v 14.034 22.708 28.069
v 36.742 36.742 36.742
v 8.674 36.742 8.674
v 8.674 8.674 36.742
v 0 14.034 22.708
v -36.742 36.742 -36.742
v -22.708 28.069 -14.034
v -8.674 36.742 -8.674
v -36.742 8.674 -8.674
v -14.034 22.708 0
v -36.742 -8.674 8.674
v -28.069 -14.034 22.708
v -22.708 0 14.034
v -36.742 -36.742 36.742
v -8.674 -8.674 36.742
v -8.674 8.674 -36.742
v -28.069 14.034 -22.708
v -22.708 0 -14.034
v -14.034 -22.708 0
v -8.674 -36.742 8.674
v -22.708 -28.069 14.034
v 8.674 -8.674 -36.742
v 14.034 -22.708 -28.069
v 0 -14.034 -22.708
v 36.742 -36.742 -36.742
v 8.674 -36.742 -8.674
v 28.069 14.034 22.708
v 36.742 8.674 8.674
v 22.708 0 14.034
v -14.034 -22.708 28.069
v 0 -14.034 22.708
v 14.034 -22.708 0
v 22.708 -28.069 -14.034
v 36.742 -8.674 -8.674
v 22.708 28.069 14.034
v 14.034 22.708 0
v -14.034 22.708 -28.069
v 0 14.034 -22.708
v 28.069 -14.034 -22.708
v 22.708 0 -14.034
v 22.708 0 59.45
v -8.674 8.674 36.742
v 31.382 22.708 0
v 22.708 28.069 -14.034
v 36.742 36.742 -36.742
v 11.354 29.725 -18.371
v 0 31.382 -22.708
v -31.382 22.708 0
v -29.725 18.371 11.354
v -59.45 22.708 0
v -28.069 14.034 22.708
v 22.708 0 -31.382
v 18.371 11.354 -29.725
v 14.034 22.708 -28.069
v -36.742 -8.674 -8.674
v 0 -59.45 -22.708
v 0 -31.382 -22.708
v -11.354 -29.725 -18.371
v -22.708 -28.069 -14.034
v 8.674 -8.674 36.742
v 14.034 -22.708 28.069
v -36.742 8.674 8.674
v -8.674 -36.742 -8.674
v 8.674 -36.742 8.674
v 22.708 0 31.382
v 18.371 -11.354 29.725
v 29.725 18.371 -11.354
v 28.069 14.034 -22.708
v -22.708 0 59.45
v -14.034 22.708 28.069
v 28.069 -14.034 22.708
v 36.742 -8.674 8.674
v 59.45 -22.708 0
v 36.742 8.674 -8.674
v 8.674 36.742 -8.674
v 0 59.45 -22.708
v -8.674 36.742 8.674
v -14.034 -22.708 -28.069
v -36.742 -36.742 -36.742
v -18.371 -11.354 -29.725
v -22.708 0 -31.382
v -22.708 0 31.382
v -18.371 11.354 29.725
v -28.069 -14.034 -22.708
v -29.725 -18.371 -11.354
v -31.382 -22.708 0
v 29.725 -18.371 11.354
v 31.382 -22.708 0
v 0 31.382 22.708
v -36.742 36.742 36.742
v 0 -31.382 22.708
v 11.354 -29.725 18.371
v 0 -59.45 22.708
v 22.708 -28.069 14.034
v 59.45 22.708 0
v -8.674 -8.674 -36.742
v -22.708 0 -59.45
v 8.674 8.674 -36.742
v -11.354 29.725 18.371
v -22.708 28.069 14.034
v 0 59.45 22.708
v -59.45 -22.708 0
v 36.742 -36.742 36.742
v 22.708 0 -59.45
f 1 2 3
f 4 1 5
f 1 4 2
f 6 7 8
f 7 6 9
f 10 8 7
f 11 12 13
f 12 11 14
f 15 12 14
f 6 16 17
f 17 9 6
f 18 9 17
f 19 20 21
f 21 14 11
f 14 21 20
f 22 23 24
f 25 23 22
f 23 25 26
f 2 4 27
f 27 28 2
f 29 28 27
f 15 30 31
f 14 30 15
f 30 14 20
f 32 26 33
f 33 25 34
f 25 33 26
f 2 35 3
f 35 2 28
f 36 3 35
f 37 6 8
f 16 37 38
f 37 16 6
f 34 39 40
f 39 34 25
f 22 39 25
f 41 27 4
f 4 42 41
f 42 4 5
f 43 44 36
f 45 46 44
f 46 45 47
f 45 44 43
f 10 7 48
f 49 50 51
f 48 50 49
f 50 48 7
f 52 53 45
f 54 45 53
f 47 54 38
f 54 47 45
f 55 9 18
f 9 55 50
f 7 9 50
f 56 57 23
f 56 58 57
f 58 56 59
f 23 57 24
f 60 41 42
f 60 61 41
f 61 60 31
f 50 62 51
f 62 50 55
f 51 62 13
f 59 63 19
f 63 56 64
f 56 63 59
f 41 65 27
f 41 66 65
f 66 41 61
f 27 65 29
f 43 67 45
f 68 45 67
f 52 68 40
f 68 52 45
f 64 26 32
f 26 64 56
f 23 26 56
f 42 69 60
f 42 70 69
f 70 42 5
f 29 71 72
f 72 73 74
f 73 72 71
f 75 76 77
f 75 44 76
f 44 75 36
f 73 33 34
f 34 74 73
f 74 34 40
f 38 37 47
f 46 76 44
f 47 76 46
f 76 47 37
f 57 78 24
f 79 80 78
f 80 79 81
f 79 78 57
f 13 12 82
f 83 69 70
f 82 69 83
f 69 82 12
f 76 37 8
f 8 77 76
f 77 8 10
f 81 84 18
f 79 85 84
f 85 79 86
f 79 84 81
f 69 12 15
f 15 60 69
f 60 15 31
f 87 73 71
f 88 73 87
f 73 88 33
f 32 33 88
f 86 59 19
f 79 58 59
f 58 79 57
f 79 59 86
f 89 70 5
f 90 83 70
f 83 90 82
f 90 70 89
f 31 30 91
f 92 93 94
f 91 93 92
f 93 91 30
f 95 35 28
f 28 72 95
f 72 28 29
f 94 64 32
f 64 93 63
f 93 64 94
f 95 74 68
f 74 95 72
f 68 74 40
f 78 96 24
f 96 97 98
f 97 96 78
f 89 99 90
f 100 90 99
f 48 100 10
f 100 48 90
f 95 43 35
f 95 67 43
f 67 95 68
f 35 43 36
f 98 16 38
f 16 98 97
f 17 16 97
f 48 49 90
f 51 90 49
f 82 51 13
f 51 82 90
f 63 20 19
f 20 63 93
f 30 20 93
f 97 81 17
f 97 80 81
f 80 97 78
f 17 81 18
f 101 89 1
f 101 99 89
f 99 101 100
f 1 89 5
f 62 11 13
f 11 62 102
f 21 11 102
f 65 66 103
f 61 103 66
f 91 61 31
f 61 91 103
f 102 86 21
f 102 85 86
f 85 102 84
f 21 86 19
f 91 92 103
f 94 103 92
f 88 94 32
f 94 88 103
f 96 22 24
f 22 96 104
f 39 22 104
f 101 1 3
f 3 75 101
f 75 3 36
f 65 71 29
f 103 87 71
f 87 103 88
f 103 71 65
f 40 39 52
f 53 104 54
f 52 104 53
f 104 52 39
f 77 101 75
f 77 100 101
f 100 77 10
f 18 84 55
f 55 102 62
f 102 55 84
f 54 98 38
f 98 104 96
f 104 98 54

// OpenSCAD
phi = (1 + sqrt(5)) / 2;
iphi = 1 / phi;

sq13 = sqrt(1/3);
sq23 = sqrt(2/3);

base = 60 * sqrt(3/8);

// Top, clockwise looking down.  ring1 is highest.
ring1 = [[1,1,1], [iphi, 0, phi], [-iphi, 0, phi], [-1, 1, 1], [0, phi, iphi]];

ring2 = [
    [phi, iphi, 0], [1, -1, 1], [-1, -1, 1], [-phi, iphi, 0], [0,phi,-iphi]];

ring3 = [[phi, -iphi, 0], [0, -phi, +iphi], [-phi, -iphi, 0],
         [-1, 1, -1], [1, 1, -1]];

ring4 = [[1, -1, -1], [0, -phi, -iphi], [-1, -1, -1], [-iphi, 0, -phi],
         [iphi, 0, -phi]];

function r1(i) = ring1[i % 5];
function r2(i) = ring2[i % 5];
function r3(i) = ring3[i % 5];
function r4(i) = ring4[i % 5];

module tetrahedron(a, b, c, d) {
    scale(base) polyhedron(
        points=[a, b, c, d],
        faces=[
            [0, 1, 2],
            [1, 0, 3],
            [0, 2, 3],
            [3, 2, 1]]);
}

module quint() {
    for (i = [0:4])
        tetrahedron(r1(i), r2(i+2), r3(i+3), r4(i));
}

module levelquint() {
    difference() {
        multmatrix(
            [
                [ sq13, 0, sq23, 0],
                [    0, 1,    0, 0],
                [-sq23, 0, sq13, base / sqrt(3) + 0.001]])
            rotate(-45) quint();
        for (i = [0:2])
            rotate(i*120+45) rotate([0,90,0])
                cylinder(r=1.1, h=base*phi - 15, $fn=20);
    }
}

module spikes() {
    rotate([180,0,0]) difference() {
        levelquint();
        translate([0,0,base*2]) cube(base * 4, center=true);
    }
}

module main() {
    intersection() {
        levelquint();
        translate([0,0,base*2]) cube(base * 4, center=true);
    }
}

quint();
//main();
//spikes();
